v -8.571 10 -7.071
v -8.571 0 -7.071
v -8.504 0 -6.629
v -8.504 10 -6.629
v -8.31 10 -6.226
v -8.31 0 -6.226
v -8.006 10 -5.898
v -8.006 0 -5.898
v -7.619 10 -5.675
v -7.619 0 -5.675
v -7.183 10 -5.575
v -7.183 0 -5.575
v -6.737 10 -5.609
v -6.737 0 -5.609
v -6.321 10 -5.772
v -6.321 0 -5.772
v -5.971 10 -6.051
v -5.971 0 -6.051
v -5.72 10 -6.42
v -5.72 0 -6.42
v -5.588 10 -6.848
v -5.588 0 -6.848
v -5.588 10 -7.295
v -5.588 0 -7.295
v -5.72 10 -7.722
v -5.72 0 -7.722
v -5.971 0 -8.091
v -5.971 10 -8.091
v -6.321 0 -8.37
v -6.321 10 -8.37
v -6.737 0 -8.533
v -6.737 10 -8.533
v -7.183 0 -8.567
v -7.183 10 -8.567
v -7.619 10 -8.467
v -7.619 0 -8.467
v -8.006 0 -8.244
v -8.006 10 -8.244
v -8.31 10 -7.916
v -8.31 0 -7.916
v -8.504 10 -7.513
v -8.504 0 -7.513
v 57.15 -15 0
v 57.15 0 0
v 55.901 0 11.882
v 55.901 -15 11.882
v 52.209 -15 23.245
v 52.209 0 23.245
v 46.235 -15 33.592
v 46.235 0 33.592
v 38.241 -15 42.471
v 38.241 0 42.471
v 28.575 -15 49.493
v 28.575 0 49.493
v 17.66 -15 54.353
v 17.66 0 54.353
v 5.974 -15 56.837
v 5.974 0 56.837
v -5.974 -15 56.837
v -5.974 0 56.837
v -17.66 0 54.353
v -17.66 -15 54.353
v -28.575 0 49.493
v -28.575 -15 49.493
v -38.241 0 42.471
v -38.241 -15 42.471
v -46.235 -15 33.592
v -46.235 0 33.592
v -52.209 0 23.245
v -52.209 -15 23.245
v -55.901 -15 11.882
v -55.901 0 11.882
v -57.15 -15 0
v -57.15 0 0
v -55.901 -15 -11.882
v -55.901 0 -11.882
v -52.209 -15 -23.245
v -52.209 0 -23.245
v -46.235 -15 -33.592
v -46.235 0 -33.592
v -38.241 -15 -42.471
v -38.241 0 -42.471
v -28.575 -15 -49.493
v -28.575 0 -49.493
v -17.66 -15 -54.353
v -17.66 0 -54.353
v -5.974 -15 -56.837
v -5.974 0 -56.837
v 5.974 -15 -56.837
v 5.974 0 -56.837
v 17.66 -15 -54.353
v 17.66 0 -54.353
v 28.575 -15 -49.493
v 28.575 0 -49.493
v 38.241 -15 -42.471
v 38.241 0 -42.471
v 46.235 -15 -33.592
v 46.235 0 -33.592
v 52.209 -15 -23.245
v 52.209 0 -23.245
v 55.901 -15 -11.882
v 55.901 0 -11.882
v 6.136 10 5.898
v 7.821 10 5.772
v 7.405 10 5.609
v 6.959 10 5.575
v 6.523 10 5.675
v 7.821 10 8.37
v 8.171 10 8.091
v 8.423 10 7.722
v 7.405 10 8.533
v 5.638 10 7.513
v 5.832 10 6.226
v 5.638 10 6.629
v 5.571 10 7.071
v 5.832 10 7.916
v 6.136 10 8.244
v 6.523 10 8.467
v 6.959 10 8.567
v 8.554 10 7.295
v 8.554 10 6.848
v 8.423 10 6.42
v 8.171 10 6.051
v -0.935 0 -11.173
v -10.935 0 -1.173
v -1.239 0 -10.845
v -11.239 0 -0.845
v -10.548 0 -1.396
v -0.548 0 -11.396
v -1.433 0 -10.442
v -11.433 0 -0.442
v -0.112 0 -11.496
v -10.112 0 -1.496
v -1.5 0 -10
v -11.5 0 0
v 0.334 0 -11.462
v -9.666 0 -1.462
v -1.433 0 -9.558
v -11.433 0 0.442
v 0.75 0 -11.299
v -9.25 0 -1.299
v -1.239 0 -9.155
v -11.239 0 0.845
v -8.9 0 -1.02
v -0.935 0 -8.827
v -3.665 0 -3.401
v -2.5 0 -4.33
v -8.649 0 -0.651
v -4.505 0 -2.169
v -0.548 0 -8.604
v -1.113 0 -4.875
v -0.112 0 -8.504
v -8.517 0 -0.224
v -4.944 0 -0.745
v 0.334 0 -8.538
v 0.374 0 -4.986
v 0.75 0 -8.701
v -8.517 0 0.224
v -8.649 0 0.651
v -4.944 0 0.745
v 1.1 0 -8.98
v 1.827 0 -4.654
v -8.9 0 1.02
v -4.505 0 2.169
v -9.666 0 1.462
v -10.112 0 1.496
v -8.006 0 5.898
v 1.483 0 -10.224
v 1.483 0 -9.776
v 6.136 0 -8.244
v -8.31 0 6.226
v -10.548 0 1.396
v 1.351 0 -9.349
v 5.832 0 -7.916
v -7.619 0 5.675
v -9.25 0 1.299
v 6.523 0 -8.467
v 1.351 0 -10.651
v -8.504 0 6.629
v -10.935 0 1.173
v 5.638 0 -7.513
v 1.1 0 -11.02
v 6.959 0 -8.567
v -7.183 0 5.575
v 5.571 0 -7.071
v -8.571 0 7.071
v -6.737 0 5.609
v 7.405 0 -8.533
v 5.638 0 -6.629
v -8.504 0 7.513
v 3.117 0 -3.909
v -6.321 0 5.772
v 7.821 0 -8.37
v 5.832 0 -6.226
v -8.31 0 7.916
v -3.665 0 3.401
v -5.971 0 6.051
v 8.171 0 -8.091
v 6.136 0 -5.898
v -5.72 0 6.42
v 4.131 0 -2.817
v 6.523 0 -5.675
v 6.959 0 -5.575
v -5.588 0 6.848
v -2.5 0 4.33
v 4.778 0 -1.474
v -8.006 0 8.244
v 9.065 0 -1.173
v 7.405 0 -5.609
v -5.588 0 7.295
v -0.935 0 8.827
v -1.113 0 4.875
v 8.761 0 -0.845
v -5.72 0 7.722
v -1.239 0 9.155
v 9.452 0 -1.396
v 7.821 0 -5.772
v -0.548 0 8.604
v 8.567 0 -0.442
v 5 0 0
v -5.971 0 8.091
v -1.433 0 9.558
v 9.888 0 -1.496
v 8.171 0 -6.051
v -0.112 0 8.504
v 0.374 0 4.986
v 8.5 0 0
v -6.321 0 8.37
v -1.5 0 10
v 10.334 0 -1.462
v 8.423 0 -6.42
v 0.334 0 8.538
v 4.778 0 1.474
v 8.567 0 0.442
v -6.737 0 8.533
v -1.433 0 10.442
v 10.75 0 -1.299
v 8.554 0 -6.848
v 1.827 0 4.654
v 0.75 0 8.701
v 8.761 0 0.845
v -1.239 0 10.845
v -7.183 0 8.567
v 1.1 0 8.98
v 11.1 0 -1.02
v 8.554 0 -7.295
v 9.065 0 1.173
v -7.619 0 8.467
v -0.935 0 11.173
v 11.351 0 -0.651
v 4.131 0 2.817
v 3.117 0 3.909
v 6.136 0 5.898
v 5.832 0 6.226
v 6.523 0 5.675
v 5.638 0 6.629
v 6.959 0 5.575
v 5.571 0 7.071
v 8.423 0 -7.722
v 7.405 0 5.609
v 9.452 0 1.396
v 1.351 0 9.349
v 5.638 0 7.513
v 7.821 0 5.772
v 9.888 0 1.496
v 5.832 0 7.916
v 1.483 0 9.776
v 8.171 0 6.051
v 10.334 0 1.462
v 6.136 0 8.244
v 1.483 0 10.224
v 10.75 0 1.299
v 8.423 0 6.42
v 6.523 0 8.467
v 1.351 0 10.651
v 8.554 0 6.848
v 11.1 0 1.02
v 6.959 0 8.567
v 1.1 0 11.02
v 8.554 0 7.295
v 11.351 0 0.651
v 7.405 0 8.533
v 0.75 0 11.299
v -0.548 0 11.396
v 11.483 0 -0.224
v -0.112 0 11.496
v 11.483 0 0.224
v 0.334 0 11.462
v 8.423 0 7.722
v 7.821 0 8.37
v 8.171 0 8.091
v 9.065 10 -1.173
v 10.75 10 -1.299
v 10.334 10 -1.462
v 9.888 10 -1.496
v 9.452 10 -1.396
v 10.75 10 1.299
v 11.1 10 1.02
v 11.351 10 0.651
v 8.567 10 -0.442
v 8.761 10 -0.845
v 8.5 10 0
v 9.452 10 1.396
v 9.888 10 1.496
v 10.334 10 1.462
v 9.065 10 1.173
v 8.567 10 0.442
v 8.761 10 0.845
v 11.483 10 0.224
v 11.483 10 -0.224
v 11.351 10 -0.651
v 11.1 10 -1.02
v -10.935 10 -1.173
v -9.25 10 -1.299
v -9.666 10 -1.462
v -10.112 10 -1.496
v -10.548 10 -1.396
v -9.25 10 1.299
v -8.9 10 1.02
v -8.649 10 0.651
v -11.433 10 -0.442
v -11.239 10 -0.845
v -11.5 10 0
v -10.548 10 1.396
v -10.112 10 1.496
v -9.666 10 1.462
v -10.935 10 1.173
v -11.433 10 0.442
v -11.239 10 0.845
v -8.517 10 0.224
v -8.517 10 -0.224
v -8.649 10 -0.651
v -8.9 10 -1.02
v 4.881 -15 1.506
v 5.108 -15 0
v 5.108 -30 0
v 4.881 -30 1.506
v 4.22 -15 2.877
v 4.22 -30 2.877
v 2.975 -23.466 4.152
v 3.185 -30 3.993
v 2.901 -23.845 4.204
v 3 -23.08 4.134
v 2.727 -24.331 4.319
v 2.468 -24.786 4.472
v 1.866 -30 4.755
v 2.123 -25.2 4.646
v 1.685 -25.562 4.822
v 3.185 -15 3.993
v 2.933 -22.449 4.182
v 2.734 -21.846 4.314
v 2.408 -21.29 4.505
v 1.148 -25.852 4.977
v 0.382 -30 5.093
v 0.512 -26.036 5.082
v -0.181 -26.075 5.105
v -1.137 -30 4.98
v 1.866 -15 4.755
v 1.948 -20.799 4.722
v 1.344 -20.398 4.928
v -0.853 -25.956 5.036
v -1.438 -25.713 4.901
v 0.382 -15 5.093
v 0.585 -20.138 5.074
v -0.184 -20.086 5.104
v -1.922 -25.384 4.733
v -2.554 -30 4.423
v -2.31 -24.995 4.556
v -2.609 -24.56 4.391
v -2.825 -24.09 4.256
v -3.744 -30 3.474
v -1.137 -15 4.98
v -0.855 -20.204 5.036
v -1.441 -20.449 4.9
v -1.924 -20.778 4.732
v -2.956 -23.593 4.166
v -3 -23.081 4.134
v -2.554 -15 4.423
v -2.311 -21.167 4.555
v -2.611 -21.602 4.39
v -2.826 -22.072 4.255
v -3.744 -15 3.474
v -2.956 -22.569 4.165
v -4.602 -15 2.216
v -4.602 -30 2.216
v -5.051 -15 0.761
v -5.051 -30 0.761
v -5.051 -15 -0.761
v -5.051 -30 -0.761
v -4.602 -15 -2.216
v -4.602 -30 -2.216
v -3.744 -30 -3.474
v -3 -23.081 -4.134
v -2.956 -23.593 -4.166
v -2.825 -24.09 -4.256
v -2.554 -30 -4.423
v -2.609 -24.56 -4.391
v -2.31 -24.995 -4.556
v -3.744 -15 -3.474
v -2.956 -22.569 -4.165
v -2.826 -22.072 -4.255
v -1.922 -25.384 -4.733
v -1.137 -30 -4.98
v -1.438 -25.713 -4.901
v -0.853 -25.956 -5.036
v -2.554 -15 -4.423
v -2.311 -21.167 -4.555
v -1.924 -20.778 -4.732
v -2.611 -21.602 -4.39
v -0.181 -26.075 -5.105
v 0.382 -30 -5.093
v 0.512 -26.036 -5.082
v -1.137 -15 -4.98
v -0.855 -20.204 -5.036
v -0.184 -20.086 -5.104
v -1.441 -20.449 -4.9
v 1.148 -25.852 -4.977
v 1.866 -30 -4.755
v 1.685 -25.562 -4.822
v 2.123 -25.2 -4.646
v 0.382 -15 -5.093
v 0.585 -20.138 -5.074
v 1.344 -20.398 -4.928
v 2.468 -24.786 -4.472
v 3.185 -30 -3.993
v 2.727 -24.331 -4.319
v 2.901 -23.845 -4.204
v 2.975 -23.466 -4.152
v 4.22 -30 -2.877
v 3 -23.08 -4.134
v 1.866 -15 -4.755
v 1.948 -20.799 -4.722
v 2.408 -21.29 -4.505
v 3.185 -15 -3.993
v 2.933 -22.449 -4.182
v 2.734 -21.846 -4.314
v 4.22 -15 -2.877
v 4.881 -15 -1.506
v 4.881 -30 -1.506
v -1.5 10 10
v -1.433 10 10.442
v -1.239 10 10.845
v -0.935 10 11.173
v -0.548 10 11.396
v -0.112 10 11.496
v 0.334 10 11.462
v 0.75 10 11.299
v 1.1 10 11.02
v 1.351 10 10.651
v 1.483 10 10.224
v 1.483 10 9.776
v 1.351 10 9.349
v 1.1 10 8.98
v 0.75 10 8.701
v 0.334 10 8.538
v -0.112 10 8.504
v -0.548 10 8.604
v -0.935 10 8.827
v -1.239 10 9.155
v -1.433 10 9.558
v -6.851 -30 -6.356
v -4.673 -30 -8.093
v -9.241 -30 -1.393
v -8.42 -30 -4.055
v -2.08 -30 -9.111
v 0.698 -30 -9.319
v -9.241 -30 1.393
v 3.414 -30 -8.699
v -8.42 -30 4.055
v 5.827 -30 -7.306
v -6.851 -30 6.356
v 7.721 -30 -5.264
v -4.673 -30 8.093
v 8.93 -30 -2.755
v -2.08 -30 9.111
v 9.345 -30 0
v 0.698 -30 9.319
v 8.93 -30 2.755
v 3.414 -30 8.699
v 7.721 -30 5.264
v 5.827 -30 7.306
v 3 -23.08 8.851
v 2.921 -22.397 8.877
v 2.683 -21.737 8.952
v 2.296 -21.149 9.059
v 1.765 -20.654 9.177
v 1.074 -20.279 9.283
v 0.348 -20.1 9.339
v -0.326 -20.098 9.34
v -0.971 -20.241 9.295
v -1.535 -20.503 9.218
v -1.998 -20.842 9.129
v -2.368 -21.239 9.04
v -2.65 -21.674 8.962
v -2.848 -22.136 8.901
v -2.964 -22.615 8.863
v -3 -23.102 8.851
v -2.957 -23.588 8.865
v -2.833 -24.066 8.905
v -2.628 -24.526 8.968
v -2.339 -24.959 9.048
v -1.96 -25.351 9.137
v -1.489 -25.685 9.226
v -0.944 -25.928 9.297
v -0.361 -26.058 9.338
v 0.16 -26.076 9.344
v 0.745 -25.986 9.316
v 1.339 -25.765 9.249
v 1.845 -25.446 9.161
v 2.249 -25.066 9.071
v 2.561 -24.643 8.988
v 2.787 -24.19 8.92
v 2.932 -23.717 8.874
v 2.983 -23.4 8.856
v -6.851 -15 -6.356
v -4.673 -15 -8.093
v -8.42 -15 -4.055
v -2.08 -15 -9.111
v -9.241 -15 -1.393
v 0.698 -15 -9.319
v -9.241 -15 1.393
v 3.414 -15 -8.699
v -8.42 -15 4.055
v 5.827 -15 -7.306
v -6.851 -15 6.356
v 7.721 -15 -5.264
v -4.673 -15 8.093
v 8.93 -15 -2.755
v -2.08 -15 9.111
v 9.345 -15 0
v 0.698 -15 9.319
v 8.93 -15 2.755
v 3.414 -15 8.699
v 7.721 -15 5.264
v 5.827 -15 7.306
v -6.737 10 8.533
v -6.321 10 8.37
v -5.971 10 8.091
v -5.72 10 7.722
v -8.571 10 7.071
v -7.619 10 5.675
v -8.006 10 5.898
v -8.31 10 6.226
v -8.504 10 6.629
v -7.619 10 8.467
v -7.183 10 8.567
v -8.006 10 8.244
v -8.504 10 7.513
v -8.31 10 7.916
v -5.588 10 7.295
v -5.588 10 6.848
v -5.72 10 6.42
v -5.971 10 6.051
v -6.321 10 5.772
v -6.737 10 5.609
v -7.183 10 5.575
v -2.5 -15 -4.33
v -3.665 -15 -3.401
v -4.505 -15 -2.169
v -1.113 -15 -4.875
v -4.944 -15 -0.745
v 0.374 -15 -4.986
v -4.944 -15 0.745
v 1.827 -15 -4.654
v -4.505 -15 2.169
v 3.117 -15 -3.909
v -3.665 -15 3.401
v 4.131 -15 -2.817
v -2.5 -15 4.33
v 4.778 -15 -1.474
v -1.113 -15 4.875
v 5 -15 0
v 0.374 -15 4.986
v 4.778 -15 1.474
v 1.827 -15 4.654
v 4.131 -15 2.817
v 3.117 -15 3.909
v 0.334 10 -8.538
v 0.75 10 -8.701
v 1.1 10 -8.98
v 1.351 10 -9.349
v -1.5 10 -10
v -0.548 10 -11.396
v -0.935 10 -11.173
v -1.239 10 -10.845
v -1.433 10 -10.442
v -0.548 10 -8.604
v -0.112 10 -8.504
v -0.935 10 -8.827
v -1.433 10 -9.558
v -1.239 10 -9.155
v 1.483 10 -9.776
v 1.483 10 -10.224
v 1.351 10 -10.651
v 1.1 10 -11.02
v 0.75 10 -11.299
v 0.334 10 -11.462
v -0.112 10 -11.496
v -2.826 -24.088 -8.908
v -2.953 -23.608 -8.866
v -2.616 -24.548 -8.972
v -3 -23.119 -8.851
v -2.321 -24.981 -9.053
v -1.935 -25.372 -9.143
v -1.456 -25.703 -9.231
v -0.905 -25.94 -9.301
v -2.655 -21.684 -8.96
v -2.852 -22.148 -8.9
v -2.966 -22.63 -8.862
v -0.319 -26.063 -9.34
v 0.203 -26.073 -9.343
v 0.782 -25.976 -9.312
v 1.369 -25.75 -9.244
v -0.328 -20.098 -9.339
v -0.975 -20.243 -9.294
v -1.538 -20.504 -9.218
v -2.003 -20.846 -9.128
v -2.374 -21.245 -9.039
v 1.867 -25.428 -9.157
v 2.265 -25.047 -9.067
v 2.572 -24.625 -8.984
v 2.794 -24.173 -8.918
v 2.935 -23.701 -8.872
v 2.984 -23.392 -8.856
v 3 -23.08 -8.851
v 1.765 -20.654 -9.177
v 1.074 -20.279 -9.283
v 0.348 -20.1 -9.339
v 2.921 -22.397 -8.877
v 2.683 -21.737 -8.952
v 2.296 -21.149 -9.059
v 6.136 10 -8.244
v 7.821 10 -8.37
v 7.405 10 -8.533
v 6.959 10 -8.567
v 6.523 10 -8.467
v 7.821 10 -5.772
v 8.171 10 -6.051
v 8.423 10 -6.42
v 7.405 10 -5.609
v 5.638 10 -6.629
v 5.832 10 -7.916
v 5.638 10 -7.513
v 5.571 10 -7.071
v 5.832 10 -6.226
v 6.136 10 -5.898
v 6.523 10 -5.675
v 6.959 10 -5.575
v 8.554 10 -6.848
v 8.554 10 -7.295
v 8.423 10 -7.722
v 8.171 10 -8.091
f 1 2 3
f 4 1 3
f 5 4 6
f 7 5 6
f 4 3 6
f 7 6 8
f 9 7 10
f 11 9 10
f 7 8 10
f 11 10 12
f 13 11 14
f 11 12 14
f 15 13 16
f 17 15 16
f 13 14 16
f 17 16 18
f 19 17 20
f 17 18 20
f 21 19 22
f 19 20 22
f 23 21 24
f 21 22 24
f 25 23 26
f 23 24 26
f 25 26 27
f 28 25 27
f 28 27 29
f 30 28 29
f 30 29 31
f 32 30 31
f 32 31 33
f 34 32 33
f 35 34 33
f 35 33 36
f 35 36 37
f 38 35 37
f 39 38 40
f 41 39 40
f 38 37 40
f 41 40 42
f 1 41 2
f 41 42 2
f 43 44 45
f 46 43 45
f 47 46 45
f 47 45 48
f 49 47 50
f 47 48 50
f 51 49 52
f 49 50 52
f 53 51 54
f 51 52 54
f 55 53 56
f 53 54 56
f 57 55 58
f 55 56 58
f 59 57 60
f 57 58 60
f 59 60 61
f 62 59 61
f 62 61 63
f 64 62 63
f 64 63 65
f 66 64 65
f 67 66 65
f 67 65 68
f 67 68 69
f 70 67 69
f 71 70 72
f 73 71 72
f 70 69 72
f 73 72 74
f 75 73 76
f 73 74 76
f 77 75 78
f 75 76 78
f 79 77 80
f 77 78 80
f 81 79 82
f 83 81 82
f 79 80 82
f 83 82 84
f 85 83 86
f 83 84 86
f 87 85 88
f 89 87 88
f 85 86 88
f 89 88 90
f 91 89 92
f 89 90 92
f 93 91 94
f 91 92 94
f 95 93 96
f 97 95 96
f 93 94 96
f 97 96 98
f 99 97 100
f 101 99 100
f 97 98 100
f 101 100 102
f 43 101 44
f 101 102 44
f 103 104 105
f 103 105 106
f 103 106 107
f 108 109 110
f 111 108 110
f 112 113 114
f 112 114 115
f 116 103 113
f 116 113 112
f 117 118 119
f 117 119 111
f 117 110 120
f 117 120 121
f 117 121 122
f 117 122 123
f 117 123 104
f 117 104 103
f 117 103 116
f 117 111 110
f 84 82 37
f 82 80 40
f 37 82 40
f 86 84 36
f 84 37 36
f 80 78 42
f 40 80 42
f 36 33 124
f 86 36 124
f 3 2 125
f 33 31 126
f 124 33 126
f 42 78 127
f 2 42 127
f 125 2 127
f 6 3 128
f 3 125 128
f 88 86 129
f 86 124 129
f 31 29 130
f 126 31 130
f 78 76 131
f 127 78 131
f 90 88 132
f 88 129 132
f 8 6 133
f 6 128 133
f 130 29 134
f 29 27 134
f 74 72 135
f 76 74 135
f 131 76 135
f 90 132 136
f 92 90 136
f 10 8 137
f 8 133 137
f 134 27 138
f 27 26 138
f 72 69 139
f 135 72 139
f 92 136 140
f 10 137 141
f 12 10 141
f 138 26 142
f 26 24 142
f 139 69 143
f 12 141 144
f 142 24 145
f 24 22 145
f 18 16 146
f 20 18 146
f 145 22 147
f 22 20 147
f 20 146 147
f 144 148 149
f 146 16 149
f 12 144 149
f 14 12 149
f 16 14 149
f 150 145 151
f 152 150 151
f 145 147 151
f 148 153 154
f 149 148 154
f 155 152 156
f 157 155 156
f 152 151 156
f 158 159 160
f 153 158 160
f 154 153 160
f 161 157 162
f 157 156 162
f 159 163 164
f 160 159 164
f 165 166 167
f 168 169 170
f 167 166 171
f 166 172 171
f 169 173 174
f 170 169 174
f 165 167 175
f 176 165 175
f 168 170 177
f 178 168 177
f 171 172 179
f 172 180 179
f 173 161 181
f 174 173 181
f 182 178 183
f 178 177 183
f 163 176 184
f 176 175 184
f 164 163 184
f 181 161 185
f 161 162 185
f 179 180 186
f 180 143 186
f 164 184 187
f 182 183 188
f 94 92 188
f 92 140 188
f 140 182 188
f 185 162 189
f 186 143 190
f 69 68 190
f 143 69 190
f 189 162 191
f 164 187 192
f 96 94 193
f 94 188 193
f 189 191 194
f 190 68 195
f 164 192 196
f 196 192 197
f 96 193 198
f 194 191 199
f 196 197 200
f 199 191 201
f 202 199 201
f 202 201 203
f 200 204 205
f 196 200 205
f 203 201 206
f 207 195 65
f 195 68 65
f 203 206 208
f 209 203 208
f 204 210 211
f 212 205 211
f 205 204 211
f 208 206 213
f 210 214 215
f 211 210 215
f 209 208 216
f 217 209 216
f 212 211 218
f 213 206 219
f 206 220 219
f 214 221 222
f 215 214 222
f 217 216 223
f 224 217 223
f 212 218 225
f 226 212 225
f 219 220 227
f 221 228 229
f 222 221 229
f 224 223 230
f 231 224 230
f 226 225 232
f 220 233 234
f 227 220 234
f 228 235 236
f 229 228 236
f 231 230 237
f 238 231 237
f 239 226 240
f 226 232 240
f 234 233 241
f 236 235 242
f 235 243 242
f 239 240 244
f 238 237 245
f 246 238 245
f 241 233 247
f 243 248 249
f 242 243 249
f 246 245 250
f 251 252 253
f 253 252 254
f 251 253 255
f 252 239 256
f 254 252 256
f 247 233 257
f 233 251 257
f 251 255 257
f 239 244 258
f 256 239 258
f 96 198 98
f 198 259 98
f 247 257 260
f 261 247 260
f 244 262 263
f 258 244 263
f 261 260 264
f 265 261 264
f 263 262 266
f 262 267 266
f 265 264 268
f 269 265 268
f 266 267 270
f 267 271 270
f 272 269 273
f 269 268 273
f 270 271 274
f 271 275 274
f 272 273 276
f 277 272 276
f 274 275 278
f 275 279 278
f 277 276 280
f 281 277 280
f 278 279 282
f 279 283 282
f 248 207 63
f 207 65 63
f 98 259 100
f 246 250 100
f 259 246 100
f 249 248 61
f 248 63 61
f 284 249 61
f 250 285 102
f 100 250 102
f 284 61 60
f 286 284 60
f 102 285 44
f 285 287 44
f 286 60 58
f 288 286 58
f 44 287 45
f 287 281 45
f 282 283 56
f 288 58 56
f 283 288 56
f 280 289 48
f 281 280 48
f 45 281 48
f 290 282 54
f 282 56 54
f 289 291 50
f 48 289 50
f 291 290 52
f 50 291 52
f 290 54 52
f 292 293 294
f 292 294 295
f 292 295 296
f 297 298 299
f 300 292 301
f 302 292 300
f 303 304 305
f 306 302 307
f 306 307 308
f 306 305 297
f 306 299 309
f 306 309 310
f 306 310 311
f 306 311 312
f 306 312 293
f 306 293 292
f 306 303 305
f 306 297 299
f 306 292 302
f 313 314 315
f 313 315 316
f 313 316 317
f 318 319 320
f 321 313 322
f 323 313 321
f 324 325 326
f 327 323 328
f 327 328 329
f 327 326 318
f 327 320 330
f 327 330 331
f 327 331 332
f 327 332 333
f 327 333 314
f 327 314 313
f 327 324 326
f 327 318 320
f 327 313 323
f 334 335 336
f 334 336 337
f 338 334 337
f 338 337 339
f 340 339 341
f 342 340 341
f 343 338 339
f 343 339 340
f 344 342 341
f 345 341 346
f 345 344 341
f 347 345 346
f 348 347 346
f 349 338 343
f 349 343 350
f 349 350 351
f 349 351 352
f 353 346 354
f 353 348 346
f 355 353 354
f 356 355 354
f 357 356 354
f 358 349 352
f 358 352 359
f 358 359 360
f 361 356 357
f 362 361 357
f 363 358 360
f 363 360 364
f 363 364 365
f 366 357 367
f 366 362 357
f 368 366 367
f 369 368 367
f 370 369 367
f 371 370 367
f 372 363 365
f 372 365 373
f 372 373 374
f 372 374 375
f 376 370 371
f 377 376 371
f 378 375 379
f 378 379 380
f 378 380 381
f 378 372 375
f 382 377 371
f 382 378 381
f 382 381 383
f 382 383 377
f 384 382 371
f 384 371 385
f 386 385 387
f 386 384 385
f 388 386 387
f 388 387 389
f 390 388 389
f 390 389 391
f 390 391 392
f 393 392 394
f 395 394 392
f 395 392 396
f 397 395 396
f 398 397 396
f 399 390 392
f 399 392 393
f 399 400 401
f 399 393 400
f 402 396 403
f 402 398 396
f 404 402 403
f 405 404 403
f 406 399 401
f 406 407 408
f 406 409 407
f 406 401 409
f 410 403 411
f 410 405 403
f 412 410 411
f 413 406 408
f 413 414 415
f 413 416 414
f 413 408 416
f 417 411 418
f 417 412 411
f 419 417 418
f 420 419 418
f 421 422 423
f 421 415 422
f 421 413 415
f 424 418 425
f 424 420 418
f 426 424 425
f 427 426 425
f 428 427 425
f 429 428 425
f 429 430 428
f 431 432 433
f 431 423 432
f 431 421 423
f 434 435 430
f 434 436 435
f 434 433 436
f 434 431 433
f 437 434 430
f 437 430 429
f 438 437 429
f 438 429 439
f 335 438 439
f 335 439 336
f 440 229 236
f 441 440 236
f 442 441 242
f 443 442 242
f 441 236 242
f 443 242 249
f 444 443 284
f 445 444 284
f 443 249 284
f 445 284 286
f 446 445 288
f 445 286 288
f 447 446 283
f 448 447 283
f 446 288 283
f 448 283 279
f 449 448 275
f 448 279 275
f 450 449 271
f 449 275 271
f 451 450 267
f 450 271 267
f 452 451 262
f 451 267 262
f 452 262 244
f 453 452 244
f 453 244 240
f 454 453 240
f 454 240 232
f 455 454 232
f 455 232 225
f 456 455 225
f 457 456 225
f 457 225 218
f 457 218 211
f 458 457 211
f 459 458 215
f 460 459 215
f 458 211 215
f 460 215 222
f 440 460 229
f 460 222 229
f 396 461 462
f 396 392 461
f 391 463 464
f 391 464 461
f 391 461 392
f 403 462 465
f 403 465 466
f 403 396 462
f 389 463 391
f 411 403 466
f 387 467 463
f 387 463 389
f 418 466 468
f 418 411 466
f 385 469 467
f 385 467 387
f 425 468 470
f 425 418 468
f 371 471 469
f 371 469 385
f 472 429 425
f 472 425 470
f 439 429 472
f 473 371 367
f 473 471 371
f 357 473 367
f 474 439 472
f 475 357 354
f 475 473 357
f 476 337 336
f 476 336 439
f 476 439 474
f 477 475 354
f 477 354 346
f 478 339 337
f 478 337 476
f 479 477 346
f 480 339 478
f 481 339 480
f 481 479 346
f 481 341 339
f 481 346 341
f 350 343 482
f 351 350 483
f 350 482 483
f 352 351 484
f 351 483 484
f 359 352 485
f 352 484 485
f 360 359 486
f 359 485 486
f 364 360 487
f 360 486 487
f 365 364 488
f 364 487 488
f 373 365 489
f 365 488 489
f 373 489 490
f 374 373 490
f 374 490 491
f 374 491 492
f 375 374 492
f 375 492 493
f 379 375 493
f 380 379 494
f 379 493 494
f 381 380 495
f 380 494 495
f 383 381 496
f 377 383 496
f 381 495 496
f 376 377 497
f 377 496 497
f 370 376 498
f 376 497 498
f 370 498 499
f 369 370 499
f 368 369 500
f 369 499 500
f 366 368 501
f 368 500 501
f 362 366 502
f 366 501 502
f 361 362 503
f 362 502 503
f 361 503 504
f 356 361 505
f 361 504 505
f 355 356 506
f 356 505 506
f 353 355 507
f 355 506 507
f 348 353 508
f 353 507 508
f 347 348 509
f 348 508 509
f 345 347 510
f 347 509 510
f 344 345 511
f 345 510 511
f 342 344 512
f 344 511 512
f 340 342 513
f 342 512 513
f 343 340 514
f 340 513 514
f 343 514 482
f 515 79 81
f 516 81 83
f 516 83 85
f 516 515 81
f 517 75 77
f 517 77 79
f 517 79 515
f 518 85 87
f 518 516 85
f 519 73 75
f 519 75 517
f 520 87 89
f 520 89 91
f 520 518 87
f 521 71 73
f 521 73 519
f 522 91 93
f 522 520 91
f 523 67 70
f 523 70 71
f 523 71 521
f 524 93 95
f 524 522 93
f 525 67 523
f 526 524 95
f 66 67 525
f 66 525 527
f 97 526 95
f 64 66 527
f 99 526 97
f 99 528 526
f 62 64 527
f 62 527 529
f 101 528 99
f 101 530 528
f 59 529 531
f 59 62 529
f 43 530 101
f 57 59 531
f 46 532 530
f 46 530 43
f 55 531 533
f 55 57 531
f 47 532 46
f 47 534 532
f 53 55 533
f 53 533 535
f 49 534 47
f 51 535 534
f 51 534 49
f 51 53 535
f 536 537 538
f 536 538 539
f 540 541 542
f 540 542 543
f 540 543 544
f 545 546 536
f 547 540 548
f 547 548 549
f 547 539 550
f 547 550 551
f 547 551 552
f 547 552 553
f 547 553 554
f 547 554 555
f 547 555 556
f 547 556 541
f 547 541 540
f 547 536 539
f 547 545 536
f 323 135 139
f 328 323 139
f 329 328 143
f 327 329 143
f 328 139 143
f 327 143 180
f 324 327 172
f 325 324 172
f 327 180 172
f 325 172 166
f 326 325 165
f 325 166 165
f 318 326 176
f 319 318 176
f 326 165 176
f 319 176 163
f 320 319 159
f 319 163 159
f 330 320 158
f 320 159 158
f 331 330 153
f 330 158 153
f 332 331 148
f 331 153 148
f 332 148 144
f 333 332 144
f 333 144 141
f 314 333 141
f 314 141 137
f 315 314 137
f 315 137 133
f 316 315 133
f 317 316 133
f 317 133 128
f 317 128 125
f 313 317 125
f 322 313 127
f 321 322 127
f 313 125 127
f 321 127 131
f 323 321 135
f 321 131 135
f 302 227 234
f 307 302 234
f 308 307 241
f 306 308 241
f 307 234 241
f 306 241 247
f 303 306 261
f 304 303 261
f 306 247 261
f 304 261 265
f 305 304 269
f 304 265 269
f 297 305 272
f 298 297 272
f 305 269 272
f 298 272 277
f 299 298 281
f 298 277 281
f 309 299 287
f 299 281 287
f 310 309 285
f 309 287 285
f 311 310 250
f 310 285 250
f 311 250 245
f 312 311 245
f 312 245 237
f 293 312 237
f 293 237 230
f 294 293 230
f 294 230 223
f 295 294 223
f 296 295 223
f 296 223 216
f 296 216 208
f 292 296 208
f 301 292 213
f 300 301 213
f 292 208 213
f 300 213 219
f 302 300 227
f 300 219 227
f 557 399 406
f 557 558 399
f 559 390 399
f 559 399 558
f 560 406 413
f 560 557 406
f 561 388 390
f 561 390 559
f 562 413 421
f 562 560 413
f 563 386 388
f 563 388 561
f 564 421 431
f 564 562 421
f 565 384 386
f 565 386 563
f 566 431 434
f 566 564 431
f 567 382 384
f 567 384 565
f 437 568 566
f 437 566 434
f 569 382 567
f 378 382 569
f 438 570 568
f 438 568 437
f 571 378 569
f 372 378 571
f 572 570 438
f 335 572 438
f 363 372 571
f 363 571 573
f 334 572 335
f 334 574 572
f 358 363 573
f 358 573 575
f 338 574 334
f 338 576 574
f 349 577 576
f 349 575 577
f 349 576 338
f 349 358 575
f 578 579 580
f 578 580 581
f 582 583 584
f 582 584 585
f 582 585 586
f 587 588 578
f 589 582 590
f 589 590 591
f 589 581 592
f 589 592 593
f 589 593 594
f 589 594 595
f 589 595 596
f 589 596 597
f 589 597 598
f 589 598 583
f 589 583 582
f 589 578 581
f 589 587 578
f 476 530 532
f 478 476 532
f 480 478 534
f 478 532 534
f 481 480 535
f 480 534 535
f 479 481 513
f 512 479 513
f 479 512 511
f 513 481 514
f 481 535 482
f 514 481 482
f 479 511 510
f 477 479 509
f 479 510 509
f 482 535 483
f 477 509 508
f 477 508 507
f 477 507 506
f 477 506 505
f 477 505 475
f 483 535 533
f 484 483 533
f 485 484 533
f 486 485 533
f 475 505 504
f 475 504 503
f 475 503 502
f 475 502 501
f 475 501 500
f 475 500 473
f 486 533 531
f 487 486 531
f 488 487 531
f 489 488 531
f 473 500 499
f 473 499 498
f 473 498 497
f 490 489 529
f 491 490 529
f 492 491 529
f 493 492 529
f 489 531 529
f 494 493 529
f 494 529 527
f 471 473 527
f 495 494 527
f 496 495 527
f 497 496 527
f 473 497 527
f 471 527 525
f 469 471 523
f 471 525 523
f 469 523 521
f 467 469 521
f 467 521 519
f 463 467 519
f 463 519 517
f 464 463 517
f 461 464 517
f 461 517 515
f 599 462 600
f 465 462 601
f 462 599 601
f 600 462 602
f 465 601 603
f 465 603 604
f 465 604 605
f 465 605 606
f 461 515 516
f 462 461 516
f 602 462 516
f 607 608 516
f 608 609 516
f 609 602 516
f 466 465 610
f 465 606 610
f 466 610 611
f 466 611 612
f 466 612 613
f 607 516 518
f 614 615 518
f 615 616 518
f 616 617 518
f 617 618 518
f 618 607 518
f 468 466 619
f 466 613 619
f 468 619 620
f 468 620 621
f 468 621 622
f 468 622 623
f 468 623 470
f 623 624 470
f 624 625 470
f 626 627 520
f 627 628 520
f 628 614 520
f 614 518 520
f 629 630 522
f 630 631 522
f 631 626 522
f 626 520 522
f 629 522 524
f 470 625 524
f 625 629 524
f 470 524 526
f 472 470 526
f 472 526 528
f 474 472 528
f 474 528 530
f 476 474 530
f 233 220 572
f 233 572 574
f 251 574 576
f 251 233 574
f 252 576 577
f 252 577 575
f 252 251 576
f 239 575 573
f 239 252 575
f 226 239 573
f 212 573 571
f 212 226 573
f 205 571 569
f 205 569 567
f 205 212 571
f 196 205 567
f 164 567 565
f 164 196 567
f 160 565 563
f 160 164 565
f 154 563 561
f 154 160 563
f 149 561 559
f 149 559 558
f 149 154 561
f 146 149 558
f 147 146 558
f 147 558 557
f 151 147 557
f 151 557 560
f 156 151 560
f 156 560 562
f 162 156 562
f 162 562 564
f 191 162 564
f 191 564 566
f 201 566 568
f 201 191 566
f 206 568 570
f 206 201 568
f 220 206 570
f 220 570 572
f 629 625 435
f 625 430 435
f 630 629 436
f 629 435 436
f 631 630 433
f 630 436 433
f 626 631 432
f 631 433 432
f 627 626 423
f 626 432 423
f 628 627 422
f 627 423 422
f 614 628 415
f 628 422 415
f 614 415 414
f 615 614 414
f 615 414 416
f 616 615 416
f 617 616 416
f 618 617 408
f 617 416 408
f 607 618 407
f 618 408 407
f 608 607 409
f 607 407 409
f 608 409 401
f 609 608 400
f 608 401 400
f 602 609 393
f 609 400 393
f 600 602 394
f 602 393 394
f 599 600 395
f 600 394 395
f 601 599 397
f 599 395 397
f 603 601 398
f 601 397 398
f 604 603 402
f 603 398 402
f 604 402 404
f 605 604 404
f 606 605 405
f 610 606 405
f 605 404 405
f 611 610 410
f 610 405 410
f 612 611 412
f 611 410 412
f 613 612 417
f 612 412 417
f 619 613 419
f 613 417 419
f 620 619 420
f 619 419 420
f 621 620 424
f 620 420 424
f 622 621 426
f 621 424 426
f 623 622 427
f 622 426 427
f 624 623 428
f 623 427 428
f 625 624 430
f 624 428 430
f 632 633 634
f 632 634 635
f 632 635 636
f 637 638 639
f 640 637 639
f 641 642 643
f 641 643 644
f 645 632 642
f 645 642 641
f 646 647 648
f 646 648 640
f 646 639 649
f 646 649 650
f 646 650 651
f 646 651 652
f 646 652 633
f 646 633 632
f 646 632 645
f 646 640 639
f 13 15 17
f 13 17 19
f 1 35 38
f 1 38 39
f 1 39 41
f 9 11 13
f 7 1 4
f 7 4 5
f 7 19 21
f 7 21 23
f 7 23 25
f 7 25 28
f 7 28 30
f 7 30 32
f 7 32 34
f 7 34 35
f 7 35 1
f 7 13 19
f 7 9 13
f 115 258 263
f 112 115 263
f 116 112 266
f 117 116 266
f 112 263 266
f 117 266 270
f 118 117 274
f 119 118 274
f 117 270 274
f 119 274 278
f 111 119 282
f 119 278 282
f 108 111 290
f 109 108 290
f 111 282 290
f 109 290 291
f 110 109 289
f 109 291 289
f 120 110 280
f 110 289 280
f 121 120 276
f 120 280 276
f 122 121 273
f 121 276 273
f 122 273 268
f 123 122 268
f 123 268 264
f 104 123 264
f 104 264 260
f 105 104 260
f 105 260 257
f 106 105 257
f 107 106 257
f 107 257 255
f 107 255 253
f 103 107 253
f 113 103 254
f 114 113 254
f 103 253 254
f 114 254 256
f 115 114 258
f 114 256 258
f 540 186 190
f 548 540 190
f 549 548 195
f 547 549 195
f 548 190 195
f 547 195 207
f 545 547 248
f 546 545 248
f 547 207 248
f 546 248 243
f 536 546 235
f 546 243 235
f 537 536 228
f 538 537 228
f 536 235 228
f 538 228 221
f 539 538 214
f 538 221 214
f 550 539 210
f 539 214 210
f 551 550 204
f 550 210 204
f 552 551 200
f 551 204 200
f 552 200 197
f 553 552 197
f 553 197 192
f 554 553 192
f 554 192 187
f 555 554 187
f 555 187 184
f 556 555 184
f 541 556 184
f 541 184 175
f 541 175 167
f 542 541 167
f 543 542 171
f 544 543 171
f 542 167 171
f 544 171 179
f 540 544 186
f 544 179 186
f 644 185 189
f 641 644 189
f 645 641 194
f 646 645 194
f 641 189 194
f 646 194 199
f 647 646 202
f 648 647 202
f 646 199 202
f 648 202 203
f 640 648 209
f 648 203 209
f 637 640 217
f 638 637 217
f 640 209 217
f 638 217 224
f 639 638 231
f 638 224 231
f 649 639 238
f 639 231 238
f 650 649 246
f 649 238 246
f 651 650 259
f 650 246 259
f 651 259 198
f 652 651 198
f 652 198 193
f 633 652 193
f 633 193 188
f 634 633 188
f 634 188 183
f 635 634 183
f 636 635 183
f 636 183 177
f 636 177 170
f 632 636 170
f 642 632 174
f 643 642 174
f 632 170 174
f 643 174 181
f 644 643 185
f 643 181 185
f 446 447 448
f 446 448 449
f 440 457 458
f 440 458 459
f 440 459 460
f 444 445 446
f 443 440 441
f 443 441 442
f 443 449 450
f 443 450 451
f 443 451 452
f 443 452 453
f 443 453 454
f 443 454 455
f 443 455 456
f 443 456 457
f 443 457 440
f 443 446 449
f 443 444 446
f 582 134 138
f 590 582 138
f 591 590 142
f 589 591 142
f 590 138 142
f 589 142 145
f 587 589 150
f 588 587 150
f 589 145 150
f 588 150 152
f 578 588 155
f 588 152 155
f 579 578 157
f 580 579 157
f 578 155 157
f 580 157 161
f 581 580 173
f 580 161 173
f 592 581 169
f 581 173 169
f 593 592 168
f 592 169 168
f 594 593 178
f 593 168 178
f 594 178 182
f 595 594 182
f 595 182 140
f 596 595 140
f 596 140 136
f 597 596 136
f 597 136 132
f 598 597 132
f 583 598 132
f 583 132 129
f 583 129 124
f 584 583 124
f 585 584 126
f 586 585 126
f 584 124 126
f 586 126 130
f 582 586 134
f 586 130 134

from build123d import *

# Parameters (mm, degrees)
F0_R     = 57.15
F0_R_2   = 5
F1_DEPTH = 15
F2_R     = 9.345244
F2_R_2   = 5.10775
F3_DEPTH = 15
F4_R     = 3
F5_DEPTH = 12.7
F6_R     = 1.5
F7_DEPTH = 10


with BuildPart() as f1:
    # F0 (on Front) → F1 (new body)
    with BuildSketch(Plane.XZ):
        Circle(F0_R)
        Circle(F0_R_2, mode=Mode.SUBTRACT)
    extrude(amount=F1_DEPTH)

    # F2 (on face) → F3 (join)
    with BuildSketch(Plane.XZ.offset(15)):
        Circle(F2_R)
        Circle(F2_R_2, mode=Mode.SUBTRACT)
    extrude(amount=F3_DEPTH)

    # F4 (on Top) → F5 (cut, symmetric)
    with BuildSketch(Plane.XY):
        with Locations((0, -23.08)):
            Circle(F4_R)
    extrude(amount=F5_DEPTH, both=True, mode=Mode.SUBTRACT)

    # F6 (on face) → F7 (join)
    with BuildSketch(Plane(origin=(0, 0, 0), x_dir=(-1, 0, 0), z_dir=(0, 1, 0))):
        with Locations((0, 10)):
            Circle(F6_R)
        with Locations((7.071068, 7.071068)):
            Circle(F6_R)
        with Locations((10, 0)):
            Circle(F6_R)
        with Locations((7.071068, -7.071068)):
            Circle(F6_R)
        with Locations((0, -10)):
            Circle(F6_R)
        with Locations((-10, 0)):
            Circle(F6_R)
        with Locations((-7.071068, -7.071068)):
            Circle(F6_R)
        with Locations((-7.071068, 7.071068)):
            Circle(F6_R)
    extrude(amount=F7_DEPTH)


solid = f1.part
